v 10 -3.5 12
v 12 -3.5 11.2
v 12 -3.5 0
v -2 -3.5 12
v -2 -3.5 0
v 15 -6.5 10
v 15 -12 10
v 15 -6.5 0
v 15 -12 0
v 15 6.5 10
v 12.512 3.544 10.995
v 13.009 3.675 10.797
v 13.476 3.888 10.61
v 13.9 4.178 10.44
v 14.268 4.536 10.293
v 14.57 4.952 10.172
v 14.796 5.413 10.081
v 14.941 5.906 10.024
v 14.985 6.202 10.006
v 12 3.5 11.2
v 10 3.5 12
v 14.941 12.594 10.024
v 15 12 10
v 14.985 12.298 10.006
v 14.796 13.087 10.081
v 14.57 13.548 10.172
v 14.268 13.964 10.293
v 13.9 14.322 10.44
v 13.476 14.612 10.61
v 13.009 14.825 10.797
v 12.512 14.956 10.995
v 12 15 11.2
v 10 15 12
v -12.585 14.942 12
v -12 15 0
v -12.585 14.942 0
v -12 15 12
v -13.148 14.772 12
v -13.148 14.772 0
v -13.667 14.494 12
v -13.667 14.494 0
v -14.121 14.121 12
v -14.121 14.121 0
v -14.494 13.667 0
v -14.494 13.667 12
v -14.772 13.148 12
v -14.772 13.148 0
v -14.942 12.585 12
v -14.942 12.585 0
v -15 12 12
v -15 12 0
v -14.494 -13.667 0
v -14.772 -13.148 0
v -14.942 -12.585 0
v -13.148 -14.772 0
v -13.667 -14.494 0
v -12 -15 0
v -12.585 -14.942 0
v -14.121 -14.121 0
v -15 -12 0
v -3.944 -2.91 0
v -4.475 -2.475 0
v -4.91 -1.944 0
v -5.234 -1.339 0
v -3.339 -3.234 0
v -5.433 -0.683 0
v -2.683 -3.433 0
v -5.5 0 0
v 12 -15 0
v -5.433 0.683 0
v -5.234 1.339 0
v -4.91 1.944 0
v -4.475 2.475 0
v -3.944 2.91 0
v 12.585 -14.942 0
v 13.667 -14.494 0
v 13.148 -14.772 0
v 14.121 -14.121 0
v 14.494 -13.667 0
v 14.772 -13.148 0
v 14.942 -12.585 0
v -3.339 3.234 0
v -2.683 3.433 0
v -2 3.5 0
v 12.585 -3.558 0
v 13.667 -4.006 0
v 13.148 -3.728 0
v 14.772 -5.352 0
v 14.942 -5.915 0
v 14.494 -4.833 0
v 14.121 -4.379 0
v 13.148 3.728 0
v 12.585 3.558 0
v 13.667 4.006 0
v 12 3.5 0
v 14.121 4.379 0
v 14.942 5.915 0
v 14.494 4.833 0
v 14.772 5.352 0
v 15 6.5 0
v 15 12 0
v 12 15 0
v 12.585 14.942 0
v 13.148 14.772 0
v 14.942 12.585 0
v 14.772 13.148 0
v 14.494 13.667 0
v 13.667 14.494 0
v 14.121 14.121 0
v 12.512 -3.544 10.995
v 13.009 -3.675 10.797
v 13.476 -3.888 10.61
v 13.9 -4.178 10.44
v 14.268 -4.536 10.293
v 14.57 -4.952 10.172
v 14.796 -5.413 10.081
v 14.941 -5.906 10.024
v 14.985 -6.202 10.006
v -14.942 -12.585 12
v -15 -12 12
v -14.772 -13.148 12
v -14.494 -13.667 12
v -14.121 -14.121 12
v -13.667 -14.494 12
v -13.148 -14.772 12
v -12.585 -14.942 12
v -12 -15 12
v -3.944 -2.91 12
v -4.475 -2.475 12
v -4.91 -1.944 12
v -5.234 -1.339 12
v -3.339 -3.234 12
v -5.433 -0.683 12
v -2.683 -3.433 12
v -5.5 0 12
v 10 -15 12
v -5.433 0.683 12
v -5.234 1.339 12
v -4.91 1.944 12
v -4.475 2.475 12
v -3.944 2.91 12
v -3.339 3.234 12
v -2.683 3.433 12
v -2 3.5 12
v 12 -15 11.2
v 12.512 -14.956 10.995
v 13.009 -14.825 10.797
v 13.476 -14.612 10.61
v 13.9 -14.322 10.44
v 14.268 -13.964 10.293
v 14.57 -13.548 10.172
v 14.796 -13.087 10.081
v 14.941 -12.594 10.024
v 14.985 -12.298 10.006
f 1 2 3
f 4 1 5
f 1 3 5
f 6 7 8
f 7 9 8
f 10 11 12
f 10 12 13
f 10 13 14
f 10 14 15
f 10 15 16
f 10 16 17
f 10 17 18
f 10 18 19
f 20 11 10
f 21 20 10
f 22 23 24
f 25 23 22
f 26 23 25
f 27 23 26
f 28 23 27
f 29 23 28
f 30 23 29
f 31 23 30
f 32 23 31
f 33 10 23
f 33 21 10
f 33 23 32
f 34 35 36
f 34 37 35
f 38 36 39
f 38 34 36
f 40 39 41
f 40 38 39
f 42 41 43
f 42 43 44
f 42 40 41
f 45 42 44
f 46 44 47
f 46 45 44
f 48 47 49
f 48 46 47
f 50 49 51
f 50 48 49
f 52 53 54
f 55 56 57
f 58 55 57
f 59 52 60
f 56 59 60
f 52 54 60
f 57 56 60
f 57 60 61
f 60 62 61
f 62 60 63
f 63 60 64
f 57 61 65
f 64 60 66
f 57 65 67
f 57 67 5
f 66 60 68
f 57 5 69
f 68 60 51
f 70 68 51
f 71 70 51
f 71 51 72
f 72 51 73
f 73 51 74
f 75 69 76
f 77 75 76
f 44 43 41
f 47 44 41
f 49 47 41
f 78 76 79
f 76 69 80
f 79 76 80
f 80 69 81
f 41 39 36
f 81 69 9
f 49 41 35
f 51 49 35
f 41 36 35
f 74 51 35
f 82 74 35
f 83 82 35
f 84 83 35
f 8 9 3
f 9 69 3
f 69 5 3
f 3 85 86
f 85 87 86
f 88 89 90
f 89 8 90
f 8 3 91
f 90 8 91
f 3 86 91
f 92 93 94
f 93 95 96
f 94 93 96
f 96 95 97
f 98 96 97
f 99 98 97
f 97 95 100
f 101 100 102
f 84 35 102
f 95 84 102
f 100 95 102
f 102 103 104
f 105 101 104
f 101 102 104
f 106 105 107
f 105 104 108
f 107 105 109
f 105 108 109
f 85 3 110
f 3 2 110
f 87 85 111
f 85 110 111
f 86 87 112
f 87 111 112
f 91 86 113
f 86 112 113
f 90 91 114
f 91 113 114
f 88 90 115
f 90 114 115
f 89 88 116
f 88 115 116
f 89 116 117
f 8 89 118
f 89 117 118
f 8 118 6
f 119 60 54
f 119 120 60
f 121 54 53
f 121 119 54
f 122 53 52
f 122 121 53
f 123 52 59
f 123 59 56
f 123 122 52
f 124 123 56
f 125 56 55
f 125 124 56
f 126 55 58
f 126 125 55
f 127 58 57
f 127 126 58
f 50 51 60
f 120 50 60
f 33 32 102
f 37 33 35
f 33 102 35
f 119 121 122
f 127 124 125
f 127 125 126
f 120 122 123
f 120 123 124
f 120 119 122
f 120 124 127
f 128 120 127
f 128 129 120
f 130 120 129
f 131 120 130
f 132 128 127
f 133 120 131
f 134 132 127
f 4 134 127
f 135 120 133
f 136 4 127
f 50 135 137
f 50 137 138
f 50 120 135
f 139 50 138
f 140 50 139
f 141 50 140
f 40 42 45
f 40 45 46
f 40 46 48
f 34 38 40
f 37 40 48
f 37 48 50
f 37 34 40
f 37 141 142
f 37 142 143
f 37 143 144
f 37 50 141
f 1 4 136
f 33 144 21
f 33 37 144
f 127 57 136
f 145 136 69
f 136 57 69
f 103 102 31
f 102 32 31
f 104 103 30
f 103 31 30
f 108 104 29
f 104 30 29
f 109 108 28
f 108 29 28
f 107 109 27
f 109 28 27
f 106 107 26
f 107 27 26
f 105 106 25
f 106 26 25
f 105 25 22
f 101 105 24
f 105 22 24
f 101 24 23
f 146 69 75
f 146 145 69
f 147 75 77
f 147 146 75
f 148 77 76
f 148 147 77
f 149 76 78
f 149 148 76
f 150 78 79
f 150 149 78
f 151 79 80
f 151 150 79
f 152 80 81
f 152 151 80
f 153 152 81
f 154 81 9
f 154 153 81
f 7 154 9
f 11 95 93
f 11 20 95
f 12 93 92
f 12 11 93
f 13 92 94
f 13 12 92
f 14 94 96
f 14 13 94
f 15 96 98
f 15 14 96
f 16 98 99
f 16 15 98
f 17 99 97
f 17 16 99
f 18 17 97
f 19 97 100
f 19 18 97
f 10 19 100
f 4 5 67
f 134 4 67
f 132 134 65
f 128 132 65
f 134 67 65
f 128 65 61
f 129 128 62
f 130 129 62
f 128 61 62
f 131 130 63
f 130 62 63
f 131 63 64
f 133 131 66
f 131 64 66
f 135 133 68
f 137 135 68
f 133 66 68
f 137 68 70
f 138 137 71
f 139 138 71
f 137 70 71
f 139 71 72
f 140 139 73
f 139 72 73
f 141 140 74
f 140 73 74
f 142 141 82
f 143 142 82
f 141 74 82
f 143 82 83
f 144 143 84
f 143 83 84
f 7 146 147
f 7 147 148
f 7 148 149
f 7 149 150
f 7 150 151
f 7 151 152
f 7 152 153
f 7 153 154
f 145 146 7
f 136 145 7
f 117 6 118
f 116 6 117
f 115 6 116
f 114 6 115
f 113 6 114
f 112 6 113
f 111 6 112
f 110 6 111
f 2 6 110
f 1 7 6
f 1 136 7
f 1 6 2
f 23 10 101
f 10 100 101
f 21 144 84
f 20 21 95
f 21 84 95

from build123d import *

# Parameters (mm, degrees)
F2_DEPTH   = 12
F3_SIZE2   = 5
F3_SIZE    = 2
F3_2_SIZE2 = 5
F3_2_SIZE  = 2
F4_R       = 3


with BuildPart() as f2:
    # F1 (on Top) → F2 (new body)
    with BuildSketch(Plane.XY):
        with BuildLine():
            Line((15, 3.5), (15, 15))
            Line((15, 15), (-15, 15))
            Line((-15, 15), (-15, -15))
            Line((-15, -15), (15, -15))
            Line((15, -15), (15, -3.5))
            Line((15, -3.5), (-2, -3.5))
            ThreePointArc((-2, -3.5), (-5.5, 0), (-2, 3.5))
            Line((-2, 3.5), (15, 3.5))
        make_face()
    extrude(amount=F2_DEPTH)

    # F3
    f3_edges = [f2.edges().sort_by_distance(p)[0] for p in [
        (15, -9.25, 12),
    ]]
    f3_side = f2.faces().sort_by_distance((15, -9.25, 6))[0]
    chamfer(f3_edges, length=F3_SIZE, length2=F3_SIZE2, reference=f3_side)

    # F3#2
    f3_2_edges = [f2.edges().sort_by_distance(p)[0] for p in [
        (15, 9.25, 12),
    ]]
    f3_2_side = f2.faces().sort_by_distance((15, 9.25, 6))[0]
    chamfer(f3_2_edges, length=F3_2_SIZE, length2=F3_2_SIZE2, reference=f3_2_side)

    # F4
    f4_edges = [f2.edges().sort_by_distance(p)[0] for p in [
        (-15, -15, 6),
        (15, -15, 5),
        (15, 15, 5),
        (-15, 15, 6),
        (15, -3.5, 5),
        (15, 3.5, 5),
    ]]
    fillet(f4_edges, radius=F4_R)


solid = f2.part
